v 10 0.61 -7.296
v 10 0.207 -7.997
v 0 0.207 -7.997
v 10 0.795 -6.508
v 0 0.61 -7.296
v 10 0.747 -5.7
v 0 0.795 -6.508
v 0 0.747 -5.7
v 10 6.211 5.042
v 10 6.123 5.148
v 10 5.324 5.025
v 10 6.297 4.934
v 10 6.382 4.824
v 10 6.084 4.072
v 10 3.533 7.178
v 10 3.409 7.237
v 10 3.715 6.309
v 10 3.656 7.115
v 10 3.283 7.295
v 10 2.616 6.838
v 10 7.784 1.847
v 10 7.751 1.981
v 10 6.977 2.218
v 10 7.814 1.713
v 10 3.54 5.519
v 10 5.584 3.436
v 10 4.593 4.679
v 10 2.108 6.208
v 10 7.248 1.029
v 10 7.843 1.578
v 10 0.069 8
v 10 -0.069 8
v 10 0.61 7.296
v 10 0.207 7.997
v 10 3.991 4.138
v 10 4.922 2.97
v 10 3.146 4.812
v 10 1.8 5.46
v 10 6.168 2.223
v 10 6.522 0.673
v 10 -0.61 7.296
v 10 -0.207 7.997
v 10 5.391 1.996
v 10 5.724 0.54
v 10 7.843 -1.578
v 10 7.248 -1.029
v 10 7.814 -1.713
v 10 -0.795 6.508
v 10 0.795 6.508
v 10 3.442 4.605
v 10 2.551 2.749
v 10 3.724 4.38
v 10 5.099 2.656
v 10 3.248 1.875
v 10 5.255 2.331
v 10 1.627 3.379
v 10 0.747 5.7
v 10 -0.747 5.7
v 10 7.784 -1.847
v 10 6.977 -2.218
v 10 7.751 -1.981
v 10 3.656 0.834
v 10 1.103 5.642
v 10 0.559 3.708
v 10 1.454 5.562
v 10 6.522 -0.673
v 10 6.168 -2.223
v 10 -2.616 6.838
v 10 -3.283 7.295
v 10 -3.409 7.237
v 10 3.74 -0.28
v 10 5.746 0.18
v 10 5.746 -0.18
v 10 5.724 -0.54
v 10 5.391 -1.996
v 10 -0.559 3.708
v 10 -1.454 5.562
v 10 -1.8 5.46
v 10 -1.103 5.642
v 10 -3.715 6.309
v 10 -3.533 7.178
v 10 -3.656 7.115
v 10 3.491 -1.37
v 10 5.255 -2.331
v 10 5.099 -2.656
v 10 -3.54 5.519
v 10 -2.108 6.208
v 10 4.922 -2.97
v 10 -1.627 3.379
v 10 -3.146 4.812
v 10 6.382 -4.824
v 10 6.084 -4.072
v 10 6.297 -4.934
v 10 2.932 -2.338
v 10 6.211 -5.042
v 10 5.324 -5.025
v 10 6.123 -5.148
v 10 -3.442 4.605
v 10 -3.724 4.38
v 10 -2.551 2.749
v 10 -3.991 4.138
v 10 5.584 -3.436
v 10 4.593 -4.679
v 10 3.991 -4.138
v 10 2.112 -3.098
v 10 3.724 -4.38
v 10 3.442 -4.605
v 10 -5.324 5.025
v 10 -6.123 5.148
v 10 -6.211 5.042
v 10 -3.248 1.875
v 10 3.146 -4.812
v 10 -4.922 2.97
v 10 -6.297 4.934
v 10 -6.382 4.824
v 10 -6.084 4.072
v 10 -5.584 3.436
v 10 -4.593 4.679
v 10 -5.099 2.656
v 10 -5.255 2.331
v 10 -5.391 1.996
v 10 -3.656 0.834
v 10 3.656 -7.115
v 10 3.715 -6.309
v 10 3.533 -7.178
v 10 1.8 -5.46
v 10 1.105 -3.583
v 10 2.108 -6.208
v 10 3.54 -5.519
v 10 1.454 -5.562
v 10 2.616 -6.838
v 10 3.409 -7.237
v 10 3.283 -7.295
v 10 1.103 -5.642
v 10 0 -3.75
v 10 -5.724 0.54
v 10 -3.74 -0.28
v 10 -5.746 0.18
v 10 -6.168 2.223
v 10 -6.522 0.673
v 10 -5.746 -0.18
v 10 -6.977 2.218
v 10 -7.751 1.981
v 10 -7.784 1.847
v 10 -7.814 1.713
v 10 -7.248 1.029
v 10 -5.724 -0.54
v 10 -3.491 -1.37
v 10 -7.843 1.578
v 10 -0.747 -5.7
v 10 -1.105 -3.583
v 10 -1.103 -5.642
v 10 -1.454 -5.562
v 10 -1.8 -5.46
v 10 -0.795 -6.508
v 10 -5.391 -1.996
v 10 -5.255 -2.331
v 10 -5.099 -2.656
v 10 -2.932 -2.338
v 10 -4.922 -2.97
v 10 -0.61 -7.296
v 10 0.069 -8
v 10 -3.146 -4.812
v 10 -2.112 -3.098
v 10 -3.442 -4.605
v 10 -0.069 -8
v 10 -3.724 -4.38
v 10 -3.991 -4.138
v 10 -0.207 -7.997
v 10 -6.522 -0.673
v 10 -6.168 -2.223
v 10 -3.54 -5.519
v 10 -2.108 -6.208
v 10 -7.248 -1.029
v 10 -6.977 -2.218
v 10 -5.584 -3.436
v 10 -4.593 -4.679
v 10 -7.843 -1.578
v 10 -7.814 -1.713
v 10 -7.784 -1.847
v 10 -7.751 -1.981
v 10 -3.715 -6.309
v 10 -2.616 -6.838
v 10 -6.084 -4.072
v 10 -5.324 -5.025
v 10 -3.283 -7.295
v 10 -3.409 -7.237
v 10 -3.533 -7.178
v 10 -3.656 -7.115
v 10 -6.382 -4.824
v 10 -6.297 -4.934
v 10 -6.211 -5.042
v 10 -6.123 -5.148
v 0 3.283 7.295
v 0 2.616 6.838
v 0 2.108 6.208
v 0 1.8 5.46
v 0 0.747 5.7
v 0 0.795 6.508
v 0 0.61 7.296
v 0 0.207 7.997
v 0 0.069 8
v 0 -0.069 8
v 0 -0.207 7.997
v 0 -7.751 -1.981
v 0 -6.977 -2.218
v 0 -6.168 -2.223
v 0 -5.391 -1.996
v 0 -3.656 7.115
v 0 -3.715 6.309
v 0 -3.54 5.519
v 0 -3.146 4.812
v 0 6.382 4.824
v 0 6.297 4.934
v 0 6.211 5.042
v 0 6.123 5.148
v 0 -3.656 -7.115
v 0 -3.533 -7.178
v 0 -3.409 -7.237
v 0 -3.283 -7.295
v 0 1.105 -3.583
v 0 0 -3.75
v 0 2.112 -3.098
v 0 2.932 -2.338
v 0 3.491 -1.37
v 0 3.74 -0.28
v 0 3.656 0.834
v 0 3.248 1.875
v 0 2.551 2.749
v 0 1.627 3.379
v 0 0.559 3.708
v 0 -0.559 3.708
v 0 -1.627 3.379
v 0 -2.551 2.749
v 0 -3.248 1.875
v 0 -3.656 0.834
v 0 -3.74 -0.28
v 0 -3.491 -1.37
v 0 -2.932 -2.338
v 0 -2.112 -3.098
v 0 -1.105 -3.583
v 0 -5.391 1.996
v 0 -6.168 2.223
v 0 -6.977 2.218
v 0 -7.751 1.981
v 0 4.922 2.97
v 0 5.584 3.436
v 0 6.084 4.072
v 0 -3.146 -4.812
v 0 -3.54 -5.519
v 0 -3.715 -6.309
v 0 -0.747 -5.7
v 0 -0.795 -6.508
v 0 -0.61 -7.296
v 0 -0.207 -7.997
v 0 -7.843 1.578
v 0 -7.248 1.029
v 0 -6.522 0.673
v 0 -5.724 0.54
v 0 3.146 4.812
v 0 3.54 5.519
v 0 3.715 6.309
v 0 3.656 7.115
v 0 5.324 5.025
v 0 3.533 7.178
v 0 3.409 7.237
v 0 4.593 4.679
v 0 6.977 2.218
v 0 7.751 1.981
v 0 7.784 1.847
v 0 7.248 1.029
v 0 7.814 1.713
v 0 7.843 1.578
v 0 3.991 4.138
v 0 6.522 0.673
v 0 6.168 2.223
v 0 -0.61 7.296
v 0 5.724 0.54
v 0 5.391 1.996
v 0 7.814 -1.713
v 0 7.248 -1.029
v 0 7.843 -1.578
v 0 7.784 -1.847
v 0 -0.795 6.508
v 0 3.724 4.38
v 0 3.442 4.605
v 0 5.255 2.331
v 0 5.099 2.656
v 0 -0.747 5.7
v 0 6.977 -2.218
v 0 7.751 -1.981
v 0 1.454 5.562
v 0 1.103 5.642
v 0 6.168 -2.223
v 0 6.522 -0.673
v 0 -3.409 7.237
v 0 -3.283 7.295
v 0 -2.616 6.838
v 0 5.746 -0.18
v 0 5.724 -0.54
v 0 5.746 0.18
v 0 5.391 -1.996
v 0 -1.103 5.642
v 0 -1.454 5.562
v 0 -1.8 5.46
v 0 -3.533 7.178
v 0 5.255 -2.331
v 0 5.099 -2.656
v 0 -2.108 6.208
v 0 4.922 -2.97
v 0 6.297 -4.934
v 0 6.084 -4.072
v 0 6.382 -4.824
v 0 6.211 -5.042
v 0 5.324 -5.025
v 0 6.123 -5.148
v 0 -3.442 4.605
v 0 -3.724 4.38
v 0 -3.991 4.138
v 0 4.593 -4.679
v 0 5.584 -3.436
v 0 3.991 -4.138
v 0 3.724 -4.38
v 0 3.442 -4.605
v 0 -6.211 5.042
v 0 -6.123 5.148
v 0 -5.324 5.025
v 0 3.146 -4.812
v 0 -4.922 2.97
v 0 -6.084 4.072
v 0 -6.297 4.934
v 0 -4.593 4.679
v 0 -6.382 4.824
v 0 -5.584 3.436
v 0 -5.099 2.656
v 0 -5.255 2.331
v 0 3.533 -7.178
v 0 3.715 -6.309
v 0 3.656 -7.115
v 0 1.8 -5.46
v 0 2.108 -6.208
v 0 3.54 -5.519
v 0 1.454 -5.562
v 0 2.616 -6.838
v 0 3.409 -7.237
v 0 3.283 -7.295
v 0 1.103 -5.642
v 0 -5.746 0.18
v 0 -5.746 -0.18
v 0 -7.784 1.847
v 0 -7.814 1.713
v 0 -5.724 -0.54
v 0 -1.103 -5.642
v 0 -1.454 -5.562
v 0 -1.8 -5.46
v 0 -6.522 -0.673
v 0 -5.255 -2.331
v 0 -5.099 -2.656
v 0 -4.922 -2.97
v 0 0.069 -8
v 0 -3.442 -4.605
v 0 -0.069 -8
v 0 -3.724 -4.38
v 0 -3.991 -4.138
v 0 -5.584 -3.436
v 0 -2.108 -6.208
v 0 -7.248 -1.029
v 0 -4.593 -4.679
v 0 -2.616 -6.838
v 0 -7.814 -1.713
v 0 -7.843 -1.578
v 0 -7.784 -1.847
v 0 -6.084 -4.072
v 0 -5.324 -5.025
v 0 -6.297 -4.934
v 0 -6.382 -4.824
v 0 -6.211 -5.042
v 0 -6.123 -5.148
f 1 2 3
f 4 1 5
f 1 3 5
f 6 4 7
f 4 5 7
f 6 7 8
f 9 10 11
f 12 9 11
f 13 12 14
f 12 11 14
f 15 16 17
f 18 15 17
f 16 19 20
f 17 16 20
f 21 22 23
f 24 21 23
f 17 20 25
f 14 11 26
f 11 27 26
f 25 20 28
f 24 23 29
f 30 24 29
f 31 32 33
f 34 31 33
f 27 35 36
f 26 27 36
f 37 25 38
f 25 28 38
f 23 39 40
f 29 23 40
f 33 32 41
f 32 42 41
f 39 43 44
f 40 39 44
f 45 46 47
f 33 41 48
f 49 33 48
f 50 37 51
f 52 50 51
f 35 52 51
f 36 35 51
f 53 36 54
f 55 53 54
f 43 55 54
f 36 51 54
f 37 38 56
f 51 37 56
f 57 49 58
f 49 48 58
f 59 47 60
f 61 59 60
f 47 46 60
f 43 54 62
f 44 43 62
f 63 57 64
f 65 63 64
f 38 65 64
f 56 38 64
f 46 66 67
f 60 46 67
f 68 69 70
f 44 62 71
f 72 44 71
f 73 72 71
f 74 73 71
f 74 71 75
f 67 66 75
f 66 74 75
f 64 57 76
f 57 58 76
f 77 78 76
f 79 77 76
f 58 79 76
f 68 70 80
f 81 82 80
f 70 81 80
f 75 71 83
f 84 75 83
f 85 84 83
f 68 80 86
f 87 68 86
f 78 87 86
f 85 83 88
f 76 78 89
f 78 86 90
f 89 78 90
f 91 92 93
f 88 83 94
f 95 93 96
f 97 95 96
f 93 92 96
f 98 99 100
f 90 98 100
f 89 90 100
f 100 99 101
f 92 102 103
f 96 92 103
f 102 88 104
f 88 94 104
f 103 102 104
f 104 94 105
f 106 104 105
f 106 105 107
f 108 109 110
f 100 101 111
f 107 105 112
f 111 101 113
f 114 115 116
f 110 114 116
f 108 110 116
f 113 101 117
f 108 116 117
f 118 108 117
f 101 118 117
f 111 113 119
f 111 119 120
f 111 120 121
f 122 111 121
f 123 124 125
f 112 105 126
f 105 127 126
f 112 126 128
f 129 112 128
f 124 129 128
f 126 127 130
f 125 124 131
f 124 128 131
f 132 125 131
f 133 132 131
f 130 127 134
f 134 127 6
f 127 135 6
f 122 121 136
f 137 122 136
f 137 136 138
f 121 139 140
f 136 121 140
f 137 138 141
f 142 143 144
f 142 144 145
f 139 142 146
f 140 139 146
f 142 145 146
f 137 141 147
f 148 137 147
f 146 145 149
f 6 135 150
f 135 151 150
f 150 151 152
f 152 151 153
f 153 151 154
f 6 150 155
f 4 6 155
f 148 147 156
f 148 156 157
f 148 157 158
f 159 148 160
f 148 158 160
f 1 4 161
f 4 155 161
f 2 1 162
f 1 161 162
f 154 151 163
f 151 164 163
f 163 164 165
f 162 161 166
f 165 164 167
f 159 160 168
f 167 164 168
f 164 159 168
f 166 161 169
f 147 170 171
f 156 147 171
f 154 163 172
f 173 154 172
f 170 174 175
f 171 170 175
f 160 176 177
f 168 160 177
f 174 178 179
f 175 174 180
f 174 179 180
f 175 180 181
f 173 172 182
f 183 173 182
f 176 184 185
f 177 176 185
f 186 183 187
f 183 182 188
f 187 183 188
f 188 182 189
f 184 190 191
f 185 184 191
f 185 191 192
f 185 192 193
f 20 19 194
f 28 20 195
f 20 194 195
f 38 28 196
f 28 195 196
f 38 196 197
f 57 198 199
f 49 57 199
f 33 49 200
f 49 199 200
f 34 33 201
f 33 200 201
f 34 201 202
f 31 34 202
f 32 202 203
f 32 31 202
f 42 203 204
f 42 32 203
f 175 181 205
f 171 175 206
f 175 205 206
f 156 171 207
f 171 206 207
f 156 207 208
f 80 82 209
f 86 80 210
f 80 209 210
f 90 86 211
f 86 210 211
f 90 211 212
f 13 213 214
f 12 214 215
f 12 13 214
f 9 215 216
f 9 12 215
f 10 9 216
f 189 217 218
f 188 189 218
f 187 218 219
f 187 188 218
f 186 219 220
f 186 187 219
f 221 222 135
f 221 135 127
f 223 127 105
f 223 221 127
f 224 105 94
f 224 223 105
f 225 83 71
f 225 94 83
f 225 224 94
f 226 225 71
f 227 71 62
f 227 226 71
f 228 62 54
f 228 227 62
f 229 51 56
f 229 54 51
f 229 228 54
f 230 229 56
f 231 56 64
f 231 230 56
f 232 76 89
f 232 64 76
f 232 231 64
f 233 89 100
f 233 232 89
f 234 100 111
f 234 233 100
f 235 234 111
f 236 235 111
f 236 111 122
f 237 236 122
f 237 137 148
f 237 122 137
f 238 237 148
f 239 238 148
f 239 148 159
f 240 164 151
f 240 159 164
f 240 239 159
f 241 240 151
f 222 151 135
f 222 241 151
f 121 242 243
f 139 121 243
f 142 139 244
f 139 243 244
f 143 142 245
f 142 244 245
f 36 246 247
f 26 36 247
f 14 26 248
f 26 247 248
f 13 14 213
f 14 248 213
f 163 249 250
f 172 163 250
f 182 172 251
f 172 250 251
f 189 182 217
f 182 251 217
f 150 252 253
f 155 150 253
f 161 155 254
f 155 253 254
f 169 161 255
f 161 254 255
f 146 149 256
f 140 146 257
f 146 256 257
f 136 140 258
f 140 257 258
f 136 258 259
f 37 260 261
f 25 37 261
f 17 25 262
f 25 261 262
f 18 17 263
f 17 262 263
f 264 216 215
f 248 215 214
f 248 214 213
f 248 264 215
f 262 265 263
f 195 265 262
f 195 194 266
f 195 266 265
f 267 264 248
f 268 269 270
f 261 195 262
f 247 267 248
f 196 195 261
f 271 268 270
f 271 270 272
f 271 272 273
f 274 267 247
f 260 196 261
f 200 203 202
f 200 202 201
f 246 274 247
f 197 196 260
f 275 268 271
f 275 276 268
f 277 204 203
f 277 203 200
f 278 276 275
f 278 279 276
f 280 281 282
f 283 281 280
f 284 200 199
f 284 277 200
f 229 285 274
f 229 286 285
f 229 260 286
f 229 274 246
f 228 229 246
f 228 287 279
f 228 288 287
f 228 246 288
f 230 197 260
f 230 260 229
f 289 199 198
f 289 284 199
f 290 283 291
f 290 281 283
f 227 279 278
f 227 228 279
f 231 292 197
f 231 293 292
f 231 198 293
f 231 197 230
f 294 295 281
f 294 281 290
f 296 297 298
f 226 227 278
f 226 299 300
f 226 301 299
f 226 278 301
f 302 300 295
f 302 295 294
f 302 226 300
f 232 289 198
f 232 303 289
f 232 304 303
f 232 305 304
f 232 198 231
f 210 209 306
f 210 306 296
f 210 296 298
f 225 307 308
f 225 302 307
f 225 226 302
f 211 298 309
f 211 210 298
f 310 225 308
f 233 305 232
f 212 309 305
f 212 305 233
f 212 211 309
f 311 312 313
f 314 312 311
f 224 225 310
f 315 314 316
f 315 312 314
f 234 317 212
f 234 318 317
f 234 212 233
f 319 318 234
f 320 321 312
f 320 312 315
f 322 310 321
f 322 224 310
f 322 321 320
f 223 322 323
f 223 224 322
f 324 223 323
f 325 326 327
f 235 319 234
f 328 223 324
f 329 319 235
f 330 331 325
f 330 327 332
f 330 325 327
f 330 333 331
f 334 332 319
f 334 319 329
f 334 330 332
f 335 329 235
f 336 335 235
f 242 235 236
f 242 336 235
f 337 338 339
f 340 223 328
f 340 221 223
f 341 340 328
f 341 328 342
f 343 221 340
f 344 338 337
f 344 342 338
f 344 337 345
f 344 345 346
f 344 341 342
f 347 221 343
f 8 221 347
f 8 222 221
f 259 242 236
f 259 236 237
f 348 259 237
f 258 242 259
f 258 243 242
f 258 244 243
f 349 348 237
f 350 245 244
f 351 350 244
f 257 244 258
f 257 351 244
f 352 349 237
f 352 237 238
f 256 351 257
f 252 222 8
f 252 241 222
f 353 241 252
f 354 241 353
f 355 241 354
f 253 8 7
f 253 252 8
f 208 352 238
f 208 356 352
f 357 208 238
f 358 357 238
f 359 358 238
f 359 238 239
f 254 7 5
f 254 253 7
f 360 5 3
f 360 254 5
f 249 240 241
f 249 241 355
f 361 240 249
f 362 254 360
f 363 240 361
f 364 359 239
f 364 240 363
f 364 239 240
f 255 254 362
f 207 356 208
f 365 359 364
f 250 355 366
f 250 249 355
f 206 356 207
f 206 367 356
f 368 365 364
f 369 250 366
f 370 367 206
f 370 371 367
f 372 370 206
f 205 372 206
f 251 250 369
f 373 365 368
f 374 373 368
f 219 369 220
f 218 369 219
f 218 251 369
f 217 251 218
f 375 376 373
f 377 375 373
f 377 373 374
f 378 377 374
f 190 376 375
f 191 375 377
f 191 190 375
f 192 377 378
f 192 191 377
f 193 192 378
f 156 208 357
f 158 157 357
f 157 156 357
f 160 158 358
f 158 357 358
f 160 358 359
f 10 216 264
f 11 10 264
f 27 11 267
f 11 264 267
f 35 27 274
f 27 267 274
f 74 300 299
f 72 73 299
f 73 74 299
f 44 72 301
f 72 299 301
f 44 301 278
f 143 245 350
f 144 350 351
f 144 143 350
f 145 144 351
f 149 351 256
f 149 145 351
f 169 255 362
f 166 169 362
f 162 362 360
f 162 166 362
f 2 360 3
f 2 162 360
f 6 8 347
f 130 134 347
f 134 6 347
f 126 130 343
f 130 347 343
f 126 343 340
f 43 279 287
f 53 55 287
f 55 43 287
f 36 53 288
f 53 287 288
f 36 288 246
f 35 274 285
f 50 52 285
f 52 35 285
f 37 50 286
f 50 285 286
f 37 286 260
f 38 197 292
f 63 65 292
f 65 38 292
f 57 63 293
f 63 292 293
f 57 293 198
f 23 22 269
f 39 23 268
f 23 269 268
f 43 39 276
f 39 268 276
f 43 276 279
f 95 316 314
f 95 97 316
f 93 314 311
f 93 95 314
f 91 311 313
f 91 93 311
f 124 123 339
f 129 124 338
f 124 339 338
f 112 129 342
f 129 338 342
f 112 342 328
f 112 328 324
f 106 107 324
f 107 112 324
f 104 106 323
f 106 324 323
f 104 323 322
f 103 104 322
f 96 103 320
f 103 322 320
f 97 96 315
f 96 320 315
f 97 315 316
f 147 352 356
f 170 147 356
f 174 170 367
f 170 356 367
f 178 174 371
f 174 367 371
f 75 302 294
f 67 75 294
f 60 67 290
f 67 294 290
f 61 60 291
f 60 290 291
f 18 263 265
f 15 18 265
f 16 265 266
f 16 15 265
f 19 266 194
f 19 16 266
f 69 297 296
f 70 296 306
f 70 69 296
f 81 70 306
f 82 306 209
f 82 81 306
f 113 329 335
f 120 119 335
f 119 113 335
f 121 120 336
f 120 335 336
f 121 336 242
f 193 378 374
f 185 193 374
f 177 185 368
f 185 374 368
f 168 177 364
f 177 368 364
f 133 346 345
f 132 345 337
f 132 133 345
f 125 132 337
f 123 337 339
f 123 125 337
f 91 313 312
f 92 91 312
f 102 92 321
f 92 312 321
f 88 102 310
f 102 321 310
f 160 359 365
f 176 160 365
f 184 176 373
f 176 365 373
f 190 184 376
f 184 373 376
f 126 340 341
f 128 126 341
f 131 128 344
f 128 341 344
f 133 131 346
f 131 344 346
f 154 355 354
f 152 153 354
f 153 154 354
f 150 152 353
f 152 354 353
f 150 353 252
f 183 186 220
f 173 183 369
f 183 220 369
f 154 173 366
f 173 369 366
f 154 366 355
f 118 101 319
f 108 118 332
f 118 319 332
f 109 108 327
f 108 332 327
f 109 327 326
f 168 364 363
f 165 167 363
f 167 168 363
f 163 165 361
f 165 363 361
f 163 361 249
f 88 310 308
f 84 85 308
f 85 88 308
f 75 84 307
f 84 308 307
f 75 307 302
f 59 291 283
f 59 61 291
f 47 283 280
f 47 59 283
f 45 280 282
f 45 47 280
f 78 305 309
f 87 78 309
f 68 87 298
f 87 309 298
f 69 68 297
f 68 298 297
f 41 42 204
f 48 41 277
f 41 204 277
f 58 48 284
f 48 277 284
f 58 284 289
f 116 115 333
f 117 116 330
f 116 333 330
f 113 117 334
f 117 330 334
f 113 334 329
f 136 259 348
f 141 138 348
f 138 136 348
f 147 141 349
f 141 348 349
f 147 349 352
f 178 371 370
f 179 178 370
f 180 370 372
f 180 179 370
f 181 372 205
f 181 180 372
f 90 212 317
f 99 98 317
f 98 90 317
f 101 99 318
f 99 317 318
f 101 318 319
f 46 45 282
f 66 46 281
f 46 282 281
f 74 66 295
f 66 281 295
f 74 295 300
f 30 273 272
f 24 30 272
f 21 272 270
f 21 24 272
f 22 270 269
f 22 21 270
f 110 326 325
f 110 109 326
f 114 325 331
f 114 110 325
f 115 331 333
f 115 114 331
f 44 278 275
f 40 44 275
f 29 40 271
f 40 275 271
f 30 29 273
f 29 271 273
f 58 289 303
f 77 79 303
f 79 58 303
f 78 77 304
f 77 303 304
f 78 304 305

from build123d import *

# Parameters (mm, degrees)
BASPROSKE_W             = 10
BASPROSKE_H             = 8
TOOTHCUT_DEPTH          = 16.099668871
TEETHCUTS_COUNT         = 14
TEETHCUTS_ANGLE         = 334.285714286
BORSKE_R                = 0.5
BORE_DEPTH              = 50.0000508
CUT_EXTRUDE1_DEPTH      = 16.017018917
CUT_EXTRUDE2_DEPTH      = 16.017018917
CUT_EXTRUDE2_DEPTH_BACK = 16.017018917
SKETCH2_R               = 3.75


with BuildPart() as part:
    # BasProSke → Base-Revolve (revolve)
    with BuildSketch(Plane(origin=(0, 0, 0), x_dir=(1, 0, 0), z_dir=(0, 1, 0)), mode=Mode.PRIVATE) as base_revolve_sk:
        with Locations((5, 4)):
            Rectangle(BASPROSKE_W, BASPROSKE_H)
    revolve(base_revolve_sk.sketch.rotate(Axis((-10, 0, 0), (1, 0, 0)), 180), axis=Axis((-10, 0, 0), (1, 0, 0)))

    # TooCutSke → ToothCut (cut, through all)
    with BuildSketch(Plane(origin=(0, 0, 0), x_dir=(0, 0, -1), z_dir=(1, 0, 0))):
        with BuildLine():
            ThreePointArc((0.540393256, 5.723545765), (0, 5.749), (-0.540393256, 5.723545765))
            ThreePointArc((-0.540393256, 5.723545765), (-0.832220085, 6.912663993), (-1.603550271, 7.863566092))
            ThreePointArc((-1.603550271, 7.863566092), (0, 8.0254), (1.603550271, 7.863566092))
            ThreePointArc((1.603550271, 7.863566092), (0.832220085, 6.912663993), (0.540393256, 5.723545765))
        make_face()
    toothcut = extrude(amount=TOOTHCUT_DEPTH, mode=Mode.SUBTRACT)

    # TeethCuts: ToothCut ×14 about axis
    teethcuts_axis = Axis((-10, 0, 0), (1, 0, 0))
    for i in range(1, TEETHCUTS_COUNT):
        add(toothcut.rotate(teethcuts_axis, i * TEETHCUTS_ANGLE / (TEETHCUTS_COUNT - 1)), mode=Mode.SUBTRACT)

    # BorSke → Bore (cut, symmetric)
    with BuildSketch(Plane(origin=(0, 0, 0), x_dir=(0, 0, -1), z_dir=(1, 0, 0))):
        with Locations(Location((0, 0, 0), (0, 0, 180))):
            Circle(BORSKE_R)
    extrude(amount=BORE_DEPTH, both=True, mode=Mode.SUBTRACT)

    # Sketch1 → Cut-Extrude1 (cut, through all)
    with BuildSketch(Plane(origin=(10, 0, 0), x_dir=(0, 0, -1), z_dir=(1, 0, 0))):
        Polygon((-1.125, -1.125), (-1.125, -3.375), (1.125, -3.375), (1.125, -1.125), (3.375, -1.125), (3.375, 1.125), (1.125, 1.125), (1.125, 3.375), (-1.125, 3.375), (-1.125, 1.125), (-3.375, 1.125), (-3.375, -1.125), align=None)
    extrude(amount=-CUT_EXTRUDE1_DEPTH, mode=Mode.SUBTRACT)

    # Sketch2 → Cut-Extrude2 (cut, two sides: drawn at the far end of the back side and taken through both)
    with BuildSketch(Plane(origin=(10, 0, 0), x_dir=(0, 0, -1), z_dir=(1, 0, 0)).offset(-CUT_EXTRUDE2_DEPTH_BACK)):
        Circle(SKETCH2_R)
    extrude(amount=CUT_EXTRUDE2_DEPTH + CUT_EXTRUDE2_DEPTH_BACK, mode=Mode.SUBTRACT)


solid = part.part
